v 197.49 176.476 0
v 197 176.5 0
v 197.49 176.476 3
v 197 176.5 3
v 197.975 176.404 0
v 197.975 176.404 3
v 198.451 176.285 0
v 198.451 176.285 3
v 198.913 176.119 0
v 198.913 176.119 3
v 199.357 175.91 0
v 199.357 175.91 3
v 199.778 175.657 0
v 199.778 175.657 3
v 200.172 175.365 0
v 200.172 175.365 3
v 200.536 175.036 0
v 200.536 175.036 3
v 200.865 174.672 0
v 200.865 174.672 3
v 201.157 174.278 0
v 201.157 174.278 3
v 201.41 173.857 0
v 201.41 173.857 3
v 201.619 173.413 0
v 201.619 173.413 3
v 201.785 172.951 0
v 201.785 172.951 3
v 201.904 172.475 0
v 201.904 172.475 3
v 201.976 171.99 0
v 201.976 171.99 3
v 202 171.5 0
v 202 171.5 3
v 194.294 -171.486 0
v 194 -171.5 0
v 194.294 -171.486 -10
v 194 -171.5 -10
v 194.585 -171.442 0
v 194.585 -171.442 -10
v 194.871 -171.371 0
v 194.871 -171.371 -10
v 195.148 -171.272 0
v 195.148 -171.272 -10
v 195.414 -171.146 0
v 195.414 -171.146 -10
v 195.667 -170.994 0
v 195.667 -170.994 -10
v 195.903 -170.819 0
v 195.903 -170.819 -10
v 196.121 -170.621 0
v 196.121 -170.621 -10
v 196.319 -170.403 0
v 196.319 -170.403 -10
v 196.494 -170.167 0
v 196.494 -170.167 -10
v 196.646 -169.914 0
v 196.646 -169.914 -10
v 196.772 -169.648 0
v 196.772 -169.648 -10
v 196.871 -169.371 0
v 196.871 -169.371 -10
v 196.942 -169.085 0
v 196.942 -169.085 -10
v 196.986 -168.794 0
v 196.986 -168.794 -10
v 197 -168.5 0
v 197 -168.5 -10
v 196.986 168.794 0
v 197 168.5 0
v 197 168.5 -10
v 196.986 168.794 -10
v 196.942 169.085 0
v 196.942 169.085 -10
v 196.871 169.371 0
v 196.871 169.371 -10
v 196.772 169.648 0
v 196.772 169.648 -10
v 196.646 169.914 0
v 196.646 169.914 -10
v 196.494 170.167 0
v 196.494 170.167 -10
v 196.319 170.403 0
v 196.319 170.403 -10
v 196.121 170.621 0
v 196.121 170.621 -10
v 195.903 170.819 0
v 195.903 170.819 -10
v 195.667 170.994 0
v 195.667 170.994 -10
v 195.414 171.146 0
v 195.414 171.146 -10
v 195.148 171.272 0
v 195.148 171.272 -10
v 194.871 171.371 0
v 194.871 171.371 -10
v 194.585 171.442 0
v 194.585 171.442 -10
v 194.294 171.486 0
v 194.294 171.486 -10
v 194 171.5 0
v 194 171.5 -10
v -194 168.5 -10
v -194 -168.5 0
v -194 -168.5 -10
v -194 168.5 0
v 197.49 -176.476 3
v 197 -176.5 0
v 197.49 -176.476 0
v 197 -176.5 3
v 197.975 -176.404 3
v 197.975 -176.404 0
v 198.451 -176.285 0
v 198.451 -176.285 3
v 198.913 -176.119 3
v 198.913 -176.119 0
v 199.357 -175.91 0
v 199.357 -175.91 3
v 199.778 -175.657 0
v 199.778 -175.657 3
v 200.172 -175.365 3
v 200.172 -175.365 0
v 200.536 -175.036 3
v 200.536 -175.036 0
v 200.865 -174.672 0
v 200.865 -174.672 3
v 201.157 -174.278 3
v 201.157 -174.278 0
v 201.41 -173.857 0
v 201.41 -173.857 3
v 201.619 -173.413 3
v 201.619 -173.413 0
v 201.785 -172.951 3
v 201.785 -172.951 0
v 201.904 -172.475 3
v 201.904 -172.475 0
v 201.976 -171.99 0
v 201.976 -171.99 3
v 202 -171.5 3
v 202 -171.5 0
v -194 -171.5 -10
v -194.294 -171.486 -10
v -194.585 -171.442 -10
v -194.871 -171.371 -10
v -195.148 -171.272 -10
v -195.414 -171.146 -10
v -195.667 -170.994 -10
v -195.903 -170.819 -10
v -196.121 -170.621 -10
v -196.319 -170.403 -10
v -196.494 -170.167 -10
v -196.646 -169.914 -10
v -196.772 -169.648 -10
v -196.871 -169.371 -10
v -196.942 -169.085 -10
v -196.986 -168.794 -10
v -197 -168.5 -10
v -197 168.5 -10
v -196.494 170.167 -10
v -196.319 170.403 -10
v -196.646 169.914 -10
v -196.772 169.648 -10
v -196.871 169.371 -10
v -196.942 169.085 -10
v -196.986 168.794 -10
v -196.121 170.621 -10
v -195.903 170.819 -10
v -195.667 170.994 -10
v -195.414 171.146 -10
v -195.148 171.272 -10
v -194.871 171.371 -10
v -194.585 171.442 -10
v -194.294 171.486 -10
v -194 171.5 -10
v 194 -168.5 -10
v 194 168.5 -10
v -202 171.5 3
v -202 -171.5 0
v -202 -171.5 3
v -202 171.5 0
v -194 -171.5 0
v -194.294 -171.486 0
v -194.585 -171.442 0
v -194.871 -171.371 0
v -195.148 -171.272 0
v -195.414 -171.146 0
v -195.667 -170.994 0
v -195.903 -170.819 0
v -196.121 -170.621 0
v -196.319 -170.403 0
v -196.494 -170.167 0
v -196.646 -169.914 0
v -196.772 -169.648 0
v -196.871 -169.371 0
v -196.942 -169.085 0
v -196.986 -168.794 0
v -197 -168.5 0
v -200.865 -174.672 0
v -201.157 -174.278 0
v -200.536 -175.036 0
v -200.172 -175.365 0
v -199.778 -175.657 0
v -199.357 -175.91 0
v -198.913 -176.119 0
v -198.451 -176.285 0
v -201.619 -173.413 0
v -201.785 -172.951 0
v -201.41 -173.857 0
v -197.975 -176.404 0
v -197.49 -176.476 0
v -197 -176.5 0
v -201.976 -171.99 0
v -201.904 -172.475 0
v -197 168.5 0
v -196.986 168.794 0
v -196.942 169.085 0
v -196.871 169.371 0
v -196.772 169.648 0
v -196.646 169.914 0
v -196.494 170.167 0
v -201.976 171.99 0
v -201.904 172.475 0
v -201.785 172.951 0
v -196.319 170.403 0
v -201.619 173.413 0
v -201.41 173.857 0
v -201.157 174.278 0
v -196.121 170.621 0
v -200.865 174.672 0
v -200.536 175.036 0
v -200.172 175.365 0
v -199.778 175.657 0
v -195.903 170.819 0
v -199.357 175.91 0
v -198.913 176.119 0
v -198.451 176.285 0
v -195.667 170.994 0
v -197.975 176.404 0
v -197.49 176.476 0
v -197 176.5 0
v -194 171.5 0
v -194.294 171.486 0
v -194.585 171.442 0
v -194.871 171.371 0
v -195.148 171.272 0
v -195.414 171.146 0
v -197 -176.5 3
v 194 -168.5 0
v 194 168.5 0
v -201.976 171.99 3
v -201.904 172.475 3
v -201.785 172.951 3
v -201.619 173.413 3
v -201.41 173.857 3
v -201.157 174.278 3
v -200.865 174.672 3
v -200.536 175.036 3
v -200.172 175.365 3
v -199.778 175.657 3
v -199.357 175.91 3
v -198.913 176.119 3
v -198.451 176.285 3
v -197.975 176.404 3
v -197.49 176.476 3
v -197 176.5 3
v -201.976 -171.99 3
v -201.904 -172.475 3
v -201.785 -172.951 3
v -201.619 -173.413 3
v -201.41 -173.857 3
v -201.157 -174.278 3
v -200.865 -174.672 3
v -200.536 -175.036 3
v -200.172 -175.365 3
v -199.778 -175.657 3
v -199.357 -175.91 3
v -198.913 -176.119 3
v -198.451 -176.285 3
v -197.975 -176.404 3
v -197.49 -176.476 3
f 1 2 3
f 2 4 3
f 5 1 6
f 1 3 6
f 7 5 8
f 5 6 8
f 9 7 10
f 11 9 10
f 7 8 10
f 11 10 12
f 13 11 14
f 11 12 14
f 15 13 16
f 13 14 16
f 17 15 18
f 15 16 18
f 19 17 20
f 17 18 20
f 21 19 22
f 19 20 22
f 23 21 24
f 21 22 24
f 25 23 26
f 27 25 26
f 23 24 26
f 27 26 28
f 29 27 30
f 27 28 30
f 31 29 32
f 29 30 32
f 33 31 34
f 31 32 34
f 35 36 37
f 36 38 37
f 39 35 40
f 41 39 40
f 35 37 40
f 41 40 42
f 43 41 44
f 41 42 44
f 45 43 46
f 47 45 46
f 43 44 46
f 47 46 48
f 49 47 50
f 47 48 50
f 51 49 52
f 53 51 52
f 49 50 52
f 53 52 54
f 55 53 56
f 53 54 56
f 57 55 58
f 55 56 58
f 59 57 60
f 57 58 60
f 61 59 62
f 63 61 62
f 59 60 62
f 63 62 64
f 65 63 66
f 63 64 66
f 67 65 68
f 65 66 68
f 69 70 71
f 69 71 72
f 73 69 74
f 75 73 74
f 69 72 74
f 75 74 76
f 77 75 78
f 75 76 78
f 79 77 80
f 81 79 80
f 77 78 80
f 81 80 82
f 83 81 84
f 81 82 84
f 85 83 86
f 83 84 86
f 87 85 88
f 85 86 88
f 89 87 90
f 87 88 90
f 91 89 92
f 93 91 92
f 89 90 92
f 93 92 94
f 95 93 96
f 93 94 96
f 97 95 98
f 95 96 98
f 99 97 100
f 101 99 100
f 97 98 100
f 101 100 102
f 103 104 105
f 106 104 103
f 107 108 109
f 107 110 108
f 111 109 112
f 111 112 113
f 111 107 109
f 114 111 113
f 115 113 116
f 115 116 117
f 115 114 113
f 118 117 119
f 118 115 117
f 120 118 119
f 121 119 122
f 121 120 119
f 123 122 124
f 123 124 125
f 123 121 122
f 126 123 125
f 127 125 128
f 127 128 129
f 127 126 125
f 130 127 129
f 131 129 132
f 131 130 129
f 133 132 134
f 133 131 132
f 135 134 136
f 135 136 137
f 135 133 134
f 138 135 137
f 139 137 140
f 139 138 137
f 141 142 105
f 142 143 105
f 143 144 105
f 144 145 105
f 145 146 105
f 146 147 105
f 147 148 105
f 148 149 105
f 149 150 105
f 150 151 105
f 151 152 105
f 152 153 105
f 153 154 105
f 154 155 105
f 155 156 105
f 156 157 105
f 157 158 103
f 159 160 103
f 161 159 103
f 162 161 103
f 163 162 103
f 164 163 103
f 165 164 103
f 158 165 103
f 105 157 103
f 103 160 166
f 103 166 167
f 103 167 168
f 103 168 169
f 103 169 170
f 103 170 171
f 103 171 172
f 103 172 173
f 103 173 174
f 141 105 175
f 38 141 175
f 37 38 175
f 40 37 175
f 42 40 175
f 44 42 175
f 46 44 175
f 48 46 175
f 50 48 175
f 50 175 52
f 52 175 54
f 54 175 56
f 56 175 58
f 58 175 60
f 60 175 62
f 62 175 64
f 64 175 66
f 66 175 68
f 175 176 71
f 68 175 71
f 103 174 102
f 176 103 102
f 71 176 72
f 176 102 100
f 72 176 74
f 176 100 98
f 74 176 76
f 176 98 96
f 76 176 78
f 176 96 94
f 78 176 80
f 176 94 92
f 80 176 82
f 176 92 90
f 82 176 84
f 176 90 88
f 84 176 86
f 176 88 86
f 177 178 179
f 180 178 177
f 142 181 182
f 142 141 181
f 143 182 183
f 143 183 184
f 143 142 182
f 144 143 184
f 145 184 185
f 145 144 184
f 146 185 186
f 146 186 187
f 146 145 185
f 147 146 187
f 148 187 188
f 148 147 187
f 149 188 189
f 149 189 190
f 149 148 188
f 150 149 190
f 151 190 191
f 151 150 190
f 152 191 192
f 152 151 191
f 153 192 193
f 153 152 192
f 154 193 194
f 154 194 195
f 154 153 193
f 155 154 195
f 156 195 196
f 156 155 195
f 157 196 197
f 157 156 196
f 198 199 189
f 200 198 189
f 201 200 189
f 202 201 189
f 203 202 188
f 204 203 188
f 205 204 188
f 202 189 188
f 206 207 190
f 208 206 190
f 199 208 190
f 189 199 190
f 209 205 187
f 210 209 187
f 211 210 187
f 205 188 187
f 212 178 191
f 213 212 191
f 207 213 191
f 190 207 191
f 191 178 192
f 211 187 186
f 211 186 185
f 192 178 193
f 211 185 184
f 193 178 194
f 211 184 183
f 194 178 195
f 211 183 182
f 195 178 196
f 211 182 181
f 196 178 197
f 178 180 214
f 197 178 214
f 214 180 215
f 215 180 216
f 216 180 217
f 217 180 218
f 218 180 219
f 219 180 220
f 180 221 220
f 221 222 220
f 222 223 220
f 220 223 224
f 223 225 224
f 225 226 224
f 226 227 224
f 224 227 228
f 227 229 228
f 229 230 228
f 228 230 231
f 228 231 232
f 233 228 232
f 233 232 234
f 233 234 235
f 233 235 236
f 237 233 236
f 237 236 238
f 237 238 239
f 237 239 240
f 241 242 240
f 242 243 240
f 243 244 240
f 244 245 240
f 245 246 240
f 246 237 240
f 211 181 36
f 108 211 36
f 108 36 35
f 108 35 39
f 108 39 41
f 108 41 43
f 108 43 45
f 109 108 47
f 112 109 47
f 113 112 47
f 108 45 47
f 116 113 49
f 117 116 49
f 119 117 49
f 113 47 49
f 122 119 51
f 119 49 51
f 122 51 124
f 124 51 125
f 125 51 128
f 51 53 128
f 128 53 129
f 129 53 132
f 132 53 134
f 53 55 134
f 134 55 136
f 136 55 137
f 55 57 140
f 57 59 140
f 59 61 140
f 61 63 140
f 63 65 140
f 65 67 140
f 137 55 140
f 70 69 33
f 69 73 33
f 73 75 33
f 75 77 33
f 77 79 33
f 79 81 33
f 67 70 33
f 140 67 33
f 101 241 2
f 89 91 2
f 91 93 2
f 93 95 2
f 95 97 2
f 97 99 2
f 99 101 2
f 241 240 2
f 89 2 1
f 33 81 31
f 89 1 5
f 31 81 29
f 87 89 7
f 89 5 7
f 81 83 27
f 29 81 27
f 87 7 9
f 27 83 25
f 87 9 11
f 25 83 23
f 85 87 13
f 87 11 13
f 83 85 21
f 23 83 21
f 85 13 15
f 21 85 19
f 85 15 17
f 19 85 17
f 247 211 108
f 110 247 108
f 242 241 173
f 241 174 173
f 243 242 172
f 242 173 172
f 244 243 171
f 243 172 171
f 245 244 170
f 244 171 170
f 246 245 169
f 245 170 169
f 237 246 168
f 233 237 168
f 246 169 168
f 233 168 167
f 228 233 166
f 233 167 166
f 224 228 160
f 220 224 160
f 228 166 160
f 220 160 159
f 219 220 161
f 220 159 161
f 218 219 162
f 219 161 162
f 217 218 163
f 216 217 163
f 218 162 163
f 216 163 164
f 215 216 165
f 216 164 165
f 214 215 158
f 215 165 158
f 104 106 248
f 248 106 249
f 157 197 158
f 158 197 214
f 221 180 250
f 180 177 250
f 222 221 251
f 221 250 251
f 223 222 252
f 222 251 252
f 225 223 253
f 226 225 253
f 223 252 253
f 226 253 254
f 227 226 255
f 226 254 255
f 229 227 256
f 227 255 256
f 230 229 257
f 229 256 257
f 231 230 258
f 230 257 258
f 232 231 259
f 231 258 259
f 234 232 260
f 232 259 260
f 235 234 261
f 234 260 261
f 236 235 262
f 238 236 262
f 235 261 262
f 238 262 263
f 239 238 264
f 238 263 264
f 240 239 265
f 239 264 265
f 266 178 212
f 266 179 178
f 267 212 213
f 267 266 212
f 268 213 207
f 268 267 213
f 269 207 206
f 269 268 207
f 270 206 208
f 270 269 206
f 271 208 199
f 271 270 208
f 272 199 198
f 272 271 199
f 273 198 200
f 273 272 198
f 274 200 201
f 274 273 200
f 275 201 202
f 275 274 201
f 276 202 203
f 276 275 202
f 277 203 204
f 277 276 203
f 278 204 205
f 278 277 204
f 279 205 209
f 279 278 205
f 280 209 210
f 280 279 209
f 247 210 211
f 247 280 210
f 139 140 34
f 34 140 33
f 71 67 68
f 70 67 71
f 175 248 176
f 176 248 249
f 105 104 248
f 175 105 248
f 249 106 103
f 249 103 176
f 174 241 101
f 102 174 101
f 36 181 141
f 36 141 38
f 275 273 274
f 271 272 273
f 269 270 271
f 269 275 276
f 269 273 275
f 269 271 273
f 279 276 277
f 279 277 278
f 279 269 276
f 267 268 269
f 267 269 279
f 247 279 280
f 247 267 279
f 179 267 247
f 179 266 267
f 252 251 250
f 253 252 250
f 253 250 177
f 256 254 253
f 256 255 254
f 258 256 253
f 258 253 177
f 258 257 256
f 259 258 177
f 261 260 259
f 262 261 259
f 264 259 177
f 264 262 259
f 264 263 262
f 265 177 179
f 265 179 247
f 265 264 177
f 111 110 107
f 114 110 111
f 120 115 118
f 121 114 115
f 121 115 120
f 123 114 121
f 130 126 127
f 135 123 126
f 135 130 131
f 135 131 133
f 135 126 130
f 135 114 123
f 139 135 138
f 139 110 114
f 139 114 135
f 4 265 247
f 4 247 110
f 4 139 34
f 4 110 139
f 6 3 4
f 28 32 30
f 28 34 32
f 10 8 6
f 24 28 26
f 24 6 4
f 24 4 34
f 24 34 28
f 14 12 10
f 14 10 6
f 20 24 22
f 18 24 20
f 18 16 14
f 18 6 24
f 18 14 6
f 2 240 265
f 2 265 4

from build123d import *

# Parameters (mm, degrees)
F0_W     = 394
F0_H     = 343
F0_W_2   = 388
F0_H_2   = 337
F1_DEPTH = 10
F2_W     = 404
F2_H     = 353
F3_DEPTH = 3
F4_R     = 5
F5_R     = 3


with BuildPart() as f1:
    # F0 (on Top) → F1 (new body)
    with BuildSketch(Plane.XY):
        Rectangle(F0_W, F0_H)
        Rectangle(F0_W_2, F0_H_2, mode=Mode.SUBTRACT)
    extrude(amount=-F1_DEPTH)

    # F2 (on face) → F3 (join)
    with BuildSketch(Plane.XY):
        Rectangle(F2_W, F2_H)
    extrude(amount=F3_DEPTH)

    # F4
    f4_edges = [f1.edges().sort_by_distance(p)[0] for p in [
        (-202, -176.5, 1.5),
        (202, -176.5, 1.5),
        (202, 176.5, 1.5),
        (-202, 176.5, 1.5),
    ]]
    fillet(f4_edges, radius=F4_R)

    # F5
    f5_edges = [f1.edges().sort_by_distance(p)[0] for p in [
        (197, 171.5, -5),
        (-197, 171.5, -5),
        (-197, -171.5, -5),
        (197, -171.5, -5),
    ]]
    fillet(f5_edges, radius=F5_R)


solid = f1.part
